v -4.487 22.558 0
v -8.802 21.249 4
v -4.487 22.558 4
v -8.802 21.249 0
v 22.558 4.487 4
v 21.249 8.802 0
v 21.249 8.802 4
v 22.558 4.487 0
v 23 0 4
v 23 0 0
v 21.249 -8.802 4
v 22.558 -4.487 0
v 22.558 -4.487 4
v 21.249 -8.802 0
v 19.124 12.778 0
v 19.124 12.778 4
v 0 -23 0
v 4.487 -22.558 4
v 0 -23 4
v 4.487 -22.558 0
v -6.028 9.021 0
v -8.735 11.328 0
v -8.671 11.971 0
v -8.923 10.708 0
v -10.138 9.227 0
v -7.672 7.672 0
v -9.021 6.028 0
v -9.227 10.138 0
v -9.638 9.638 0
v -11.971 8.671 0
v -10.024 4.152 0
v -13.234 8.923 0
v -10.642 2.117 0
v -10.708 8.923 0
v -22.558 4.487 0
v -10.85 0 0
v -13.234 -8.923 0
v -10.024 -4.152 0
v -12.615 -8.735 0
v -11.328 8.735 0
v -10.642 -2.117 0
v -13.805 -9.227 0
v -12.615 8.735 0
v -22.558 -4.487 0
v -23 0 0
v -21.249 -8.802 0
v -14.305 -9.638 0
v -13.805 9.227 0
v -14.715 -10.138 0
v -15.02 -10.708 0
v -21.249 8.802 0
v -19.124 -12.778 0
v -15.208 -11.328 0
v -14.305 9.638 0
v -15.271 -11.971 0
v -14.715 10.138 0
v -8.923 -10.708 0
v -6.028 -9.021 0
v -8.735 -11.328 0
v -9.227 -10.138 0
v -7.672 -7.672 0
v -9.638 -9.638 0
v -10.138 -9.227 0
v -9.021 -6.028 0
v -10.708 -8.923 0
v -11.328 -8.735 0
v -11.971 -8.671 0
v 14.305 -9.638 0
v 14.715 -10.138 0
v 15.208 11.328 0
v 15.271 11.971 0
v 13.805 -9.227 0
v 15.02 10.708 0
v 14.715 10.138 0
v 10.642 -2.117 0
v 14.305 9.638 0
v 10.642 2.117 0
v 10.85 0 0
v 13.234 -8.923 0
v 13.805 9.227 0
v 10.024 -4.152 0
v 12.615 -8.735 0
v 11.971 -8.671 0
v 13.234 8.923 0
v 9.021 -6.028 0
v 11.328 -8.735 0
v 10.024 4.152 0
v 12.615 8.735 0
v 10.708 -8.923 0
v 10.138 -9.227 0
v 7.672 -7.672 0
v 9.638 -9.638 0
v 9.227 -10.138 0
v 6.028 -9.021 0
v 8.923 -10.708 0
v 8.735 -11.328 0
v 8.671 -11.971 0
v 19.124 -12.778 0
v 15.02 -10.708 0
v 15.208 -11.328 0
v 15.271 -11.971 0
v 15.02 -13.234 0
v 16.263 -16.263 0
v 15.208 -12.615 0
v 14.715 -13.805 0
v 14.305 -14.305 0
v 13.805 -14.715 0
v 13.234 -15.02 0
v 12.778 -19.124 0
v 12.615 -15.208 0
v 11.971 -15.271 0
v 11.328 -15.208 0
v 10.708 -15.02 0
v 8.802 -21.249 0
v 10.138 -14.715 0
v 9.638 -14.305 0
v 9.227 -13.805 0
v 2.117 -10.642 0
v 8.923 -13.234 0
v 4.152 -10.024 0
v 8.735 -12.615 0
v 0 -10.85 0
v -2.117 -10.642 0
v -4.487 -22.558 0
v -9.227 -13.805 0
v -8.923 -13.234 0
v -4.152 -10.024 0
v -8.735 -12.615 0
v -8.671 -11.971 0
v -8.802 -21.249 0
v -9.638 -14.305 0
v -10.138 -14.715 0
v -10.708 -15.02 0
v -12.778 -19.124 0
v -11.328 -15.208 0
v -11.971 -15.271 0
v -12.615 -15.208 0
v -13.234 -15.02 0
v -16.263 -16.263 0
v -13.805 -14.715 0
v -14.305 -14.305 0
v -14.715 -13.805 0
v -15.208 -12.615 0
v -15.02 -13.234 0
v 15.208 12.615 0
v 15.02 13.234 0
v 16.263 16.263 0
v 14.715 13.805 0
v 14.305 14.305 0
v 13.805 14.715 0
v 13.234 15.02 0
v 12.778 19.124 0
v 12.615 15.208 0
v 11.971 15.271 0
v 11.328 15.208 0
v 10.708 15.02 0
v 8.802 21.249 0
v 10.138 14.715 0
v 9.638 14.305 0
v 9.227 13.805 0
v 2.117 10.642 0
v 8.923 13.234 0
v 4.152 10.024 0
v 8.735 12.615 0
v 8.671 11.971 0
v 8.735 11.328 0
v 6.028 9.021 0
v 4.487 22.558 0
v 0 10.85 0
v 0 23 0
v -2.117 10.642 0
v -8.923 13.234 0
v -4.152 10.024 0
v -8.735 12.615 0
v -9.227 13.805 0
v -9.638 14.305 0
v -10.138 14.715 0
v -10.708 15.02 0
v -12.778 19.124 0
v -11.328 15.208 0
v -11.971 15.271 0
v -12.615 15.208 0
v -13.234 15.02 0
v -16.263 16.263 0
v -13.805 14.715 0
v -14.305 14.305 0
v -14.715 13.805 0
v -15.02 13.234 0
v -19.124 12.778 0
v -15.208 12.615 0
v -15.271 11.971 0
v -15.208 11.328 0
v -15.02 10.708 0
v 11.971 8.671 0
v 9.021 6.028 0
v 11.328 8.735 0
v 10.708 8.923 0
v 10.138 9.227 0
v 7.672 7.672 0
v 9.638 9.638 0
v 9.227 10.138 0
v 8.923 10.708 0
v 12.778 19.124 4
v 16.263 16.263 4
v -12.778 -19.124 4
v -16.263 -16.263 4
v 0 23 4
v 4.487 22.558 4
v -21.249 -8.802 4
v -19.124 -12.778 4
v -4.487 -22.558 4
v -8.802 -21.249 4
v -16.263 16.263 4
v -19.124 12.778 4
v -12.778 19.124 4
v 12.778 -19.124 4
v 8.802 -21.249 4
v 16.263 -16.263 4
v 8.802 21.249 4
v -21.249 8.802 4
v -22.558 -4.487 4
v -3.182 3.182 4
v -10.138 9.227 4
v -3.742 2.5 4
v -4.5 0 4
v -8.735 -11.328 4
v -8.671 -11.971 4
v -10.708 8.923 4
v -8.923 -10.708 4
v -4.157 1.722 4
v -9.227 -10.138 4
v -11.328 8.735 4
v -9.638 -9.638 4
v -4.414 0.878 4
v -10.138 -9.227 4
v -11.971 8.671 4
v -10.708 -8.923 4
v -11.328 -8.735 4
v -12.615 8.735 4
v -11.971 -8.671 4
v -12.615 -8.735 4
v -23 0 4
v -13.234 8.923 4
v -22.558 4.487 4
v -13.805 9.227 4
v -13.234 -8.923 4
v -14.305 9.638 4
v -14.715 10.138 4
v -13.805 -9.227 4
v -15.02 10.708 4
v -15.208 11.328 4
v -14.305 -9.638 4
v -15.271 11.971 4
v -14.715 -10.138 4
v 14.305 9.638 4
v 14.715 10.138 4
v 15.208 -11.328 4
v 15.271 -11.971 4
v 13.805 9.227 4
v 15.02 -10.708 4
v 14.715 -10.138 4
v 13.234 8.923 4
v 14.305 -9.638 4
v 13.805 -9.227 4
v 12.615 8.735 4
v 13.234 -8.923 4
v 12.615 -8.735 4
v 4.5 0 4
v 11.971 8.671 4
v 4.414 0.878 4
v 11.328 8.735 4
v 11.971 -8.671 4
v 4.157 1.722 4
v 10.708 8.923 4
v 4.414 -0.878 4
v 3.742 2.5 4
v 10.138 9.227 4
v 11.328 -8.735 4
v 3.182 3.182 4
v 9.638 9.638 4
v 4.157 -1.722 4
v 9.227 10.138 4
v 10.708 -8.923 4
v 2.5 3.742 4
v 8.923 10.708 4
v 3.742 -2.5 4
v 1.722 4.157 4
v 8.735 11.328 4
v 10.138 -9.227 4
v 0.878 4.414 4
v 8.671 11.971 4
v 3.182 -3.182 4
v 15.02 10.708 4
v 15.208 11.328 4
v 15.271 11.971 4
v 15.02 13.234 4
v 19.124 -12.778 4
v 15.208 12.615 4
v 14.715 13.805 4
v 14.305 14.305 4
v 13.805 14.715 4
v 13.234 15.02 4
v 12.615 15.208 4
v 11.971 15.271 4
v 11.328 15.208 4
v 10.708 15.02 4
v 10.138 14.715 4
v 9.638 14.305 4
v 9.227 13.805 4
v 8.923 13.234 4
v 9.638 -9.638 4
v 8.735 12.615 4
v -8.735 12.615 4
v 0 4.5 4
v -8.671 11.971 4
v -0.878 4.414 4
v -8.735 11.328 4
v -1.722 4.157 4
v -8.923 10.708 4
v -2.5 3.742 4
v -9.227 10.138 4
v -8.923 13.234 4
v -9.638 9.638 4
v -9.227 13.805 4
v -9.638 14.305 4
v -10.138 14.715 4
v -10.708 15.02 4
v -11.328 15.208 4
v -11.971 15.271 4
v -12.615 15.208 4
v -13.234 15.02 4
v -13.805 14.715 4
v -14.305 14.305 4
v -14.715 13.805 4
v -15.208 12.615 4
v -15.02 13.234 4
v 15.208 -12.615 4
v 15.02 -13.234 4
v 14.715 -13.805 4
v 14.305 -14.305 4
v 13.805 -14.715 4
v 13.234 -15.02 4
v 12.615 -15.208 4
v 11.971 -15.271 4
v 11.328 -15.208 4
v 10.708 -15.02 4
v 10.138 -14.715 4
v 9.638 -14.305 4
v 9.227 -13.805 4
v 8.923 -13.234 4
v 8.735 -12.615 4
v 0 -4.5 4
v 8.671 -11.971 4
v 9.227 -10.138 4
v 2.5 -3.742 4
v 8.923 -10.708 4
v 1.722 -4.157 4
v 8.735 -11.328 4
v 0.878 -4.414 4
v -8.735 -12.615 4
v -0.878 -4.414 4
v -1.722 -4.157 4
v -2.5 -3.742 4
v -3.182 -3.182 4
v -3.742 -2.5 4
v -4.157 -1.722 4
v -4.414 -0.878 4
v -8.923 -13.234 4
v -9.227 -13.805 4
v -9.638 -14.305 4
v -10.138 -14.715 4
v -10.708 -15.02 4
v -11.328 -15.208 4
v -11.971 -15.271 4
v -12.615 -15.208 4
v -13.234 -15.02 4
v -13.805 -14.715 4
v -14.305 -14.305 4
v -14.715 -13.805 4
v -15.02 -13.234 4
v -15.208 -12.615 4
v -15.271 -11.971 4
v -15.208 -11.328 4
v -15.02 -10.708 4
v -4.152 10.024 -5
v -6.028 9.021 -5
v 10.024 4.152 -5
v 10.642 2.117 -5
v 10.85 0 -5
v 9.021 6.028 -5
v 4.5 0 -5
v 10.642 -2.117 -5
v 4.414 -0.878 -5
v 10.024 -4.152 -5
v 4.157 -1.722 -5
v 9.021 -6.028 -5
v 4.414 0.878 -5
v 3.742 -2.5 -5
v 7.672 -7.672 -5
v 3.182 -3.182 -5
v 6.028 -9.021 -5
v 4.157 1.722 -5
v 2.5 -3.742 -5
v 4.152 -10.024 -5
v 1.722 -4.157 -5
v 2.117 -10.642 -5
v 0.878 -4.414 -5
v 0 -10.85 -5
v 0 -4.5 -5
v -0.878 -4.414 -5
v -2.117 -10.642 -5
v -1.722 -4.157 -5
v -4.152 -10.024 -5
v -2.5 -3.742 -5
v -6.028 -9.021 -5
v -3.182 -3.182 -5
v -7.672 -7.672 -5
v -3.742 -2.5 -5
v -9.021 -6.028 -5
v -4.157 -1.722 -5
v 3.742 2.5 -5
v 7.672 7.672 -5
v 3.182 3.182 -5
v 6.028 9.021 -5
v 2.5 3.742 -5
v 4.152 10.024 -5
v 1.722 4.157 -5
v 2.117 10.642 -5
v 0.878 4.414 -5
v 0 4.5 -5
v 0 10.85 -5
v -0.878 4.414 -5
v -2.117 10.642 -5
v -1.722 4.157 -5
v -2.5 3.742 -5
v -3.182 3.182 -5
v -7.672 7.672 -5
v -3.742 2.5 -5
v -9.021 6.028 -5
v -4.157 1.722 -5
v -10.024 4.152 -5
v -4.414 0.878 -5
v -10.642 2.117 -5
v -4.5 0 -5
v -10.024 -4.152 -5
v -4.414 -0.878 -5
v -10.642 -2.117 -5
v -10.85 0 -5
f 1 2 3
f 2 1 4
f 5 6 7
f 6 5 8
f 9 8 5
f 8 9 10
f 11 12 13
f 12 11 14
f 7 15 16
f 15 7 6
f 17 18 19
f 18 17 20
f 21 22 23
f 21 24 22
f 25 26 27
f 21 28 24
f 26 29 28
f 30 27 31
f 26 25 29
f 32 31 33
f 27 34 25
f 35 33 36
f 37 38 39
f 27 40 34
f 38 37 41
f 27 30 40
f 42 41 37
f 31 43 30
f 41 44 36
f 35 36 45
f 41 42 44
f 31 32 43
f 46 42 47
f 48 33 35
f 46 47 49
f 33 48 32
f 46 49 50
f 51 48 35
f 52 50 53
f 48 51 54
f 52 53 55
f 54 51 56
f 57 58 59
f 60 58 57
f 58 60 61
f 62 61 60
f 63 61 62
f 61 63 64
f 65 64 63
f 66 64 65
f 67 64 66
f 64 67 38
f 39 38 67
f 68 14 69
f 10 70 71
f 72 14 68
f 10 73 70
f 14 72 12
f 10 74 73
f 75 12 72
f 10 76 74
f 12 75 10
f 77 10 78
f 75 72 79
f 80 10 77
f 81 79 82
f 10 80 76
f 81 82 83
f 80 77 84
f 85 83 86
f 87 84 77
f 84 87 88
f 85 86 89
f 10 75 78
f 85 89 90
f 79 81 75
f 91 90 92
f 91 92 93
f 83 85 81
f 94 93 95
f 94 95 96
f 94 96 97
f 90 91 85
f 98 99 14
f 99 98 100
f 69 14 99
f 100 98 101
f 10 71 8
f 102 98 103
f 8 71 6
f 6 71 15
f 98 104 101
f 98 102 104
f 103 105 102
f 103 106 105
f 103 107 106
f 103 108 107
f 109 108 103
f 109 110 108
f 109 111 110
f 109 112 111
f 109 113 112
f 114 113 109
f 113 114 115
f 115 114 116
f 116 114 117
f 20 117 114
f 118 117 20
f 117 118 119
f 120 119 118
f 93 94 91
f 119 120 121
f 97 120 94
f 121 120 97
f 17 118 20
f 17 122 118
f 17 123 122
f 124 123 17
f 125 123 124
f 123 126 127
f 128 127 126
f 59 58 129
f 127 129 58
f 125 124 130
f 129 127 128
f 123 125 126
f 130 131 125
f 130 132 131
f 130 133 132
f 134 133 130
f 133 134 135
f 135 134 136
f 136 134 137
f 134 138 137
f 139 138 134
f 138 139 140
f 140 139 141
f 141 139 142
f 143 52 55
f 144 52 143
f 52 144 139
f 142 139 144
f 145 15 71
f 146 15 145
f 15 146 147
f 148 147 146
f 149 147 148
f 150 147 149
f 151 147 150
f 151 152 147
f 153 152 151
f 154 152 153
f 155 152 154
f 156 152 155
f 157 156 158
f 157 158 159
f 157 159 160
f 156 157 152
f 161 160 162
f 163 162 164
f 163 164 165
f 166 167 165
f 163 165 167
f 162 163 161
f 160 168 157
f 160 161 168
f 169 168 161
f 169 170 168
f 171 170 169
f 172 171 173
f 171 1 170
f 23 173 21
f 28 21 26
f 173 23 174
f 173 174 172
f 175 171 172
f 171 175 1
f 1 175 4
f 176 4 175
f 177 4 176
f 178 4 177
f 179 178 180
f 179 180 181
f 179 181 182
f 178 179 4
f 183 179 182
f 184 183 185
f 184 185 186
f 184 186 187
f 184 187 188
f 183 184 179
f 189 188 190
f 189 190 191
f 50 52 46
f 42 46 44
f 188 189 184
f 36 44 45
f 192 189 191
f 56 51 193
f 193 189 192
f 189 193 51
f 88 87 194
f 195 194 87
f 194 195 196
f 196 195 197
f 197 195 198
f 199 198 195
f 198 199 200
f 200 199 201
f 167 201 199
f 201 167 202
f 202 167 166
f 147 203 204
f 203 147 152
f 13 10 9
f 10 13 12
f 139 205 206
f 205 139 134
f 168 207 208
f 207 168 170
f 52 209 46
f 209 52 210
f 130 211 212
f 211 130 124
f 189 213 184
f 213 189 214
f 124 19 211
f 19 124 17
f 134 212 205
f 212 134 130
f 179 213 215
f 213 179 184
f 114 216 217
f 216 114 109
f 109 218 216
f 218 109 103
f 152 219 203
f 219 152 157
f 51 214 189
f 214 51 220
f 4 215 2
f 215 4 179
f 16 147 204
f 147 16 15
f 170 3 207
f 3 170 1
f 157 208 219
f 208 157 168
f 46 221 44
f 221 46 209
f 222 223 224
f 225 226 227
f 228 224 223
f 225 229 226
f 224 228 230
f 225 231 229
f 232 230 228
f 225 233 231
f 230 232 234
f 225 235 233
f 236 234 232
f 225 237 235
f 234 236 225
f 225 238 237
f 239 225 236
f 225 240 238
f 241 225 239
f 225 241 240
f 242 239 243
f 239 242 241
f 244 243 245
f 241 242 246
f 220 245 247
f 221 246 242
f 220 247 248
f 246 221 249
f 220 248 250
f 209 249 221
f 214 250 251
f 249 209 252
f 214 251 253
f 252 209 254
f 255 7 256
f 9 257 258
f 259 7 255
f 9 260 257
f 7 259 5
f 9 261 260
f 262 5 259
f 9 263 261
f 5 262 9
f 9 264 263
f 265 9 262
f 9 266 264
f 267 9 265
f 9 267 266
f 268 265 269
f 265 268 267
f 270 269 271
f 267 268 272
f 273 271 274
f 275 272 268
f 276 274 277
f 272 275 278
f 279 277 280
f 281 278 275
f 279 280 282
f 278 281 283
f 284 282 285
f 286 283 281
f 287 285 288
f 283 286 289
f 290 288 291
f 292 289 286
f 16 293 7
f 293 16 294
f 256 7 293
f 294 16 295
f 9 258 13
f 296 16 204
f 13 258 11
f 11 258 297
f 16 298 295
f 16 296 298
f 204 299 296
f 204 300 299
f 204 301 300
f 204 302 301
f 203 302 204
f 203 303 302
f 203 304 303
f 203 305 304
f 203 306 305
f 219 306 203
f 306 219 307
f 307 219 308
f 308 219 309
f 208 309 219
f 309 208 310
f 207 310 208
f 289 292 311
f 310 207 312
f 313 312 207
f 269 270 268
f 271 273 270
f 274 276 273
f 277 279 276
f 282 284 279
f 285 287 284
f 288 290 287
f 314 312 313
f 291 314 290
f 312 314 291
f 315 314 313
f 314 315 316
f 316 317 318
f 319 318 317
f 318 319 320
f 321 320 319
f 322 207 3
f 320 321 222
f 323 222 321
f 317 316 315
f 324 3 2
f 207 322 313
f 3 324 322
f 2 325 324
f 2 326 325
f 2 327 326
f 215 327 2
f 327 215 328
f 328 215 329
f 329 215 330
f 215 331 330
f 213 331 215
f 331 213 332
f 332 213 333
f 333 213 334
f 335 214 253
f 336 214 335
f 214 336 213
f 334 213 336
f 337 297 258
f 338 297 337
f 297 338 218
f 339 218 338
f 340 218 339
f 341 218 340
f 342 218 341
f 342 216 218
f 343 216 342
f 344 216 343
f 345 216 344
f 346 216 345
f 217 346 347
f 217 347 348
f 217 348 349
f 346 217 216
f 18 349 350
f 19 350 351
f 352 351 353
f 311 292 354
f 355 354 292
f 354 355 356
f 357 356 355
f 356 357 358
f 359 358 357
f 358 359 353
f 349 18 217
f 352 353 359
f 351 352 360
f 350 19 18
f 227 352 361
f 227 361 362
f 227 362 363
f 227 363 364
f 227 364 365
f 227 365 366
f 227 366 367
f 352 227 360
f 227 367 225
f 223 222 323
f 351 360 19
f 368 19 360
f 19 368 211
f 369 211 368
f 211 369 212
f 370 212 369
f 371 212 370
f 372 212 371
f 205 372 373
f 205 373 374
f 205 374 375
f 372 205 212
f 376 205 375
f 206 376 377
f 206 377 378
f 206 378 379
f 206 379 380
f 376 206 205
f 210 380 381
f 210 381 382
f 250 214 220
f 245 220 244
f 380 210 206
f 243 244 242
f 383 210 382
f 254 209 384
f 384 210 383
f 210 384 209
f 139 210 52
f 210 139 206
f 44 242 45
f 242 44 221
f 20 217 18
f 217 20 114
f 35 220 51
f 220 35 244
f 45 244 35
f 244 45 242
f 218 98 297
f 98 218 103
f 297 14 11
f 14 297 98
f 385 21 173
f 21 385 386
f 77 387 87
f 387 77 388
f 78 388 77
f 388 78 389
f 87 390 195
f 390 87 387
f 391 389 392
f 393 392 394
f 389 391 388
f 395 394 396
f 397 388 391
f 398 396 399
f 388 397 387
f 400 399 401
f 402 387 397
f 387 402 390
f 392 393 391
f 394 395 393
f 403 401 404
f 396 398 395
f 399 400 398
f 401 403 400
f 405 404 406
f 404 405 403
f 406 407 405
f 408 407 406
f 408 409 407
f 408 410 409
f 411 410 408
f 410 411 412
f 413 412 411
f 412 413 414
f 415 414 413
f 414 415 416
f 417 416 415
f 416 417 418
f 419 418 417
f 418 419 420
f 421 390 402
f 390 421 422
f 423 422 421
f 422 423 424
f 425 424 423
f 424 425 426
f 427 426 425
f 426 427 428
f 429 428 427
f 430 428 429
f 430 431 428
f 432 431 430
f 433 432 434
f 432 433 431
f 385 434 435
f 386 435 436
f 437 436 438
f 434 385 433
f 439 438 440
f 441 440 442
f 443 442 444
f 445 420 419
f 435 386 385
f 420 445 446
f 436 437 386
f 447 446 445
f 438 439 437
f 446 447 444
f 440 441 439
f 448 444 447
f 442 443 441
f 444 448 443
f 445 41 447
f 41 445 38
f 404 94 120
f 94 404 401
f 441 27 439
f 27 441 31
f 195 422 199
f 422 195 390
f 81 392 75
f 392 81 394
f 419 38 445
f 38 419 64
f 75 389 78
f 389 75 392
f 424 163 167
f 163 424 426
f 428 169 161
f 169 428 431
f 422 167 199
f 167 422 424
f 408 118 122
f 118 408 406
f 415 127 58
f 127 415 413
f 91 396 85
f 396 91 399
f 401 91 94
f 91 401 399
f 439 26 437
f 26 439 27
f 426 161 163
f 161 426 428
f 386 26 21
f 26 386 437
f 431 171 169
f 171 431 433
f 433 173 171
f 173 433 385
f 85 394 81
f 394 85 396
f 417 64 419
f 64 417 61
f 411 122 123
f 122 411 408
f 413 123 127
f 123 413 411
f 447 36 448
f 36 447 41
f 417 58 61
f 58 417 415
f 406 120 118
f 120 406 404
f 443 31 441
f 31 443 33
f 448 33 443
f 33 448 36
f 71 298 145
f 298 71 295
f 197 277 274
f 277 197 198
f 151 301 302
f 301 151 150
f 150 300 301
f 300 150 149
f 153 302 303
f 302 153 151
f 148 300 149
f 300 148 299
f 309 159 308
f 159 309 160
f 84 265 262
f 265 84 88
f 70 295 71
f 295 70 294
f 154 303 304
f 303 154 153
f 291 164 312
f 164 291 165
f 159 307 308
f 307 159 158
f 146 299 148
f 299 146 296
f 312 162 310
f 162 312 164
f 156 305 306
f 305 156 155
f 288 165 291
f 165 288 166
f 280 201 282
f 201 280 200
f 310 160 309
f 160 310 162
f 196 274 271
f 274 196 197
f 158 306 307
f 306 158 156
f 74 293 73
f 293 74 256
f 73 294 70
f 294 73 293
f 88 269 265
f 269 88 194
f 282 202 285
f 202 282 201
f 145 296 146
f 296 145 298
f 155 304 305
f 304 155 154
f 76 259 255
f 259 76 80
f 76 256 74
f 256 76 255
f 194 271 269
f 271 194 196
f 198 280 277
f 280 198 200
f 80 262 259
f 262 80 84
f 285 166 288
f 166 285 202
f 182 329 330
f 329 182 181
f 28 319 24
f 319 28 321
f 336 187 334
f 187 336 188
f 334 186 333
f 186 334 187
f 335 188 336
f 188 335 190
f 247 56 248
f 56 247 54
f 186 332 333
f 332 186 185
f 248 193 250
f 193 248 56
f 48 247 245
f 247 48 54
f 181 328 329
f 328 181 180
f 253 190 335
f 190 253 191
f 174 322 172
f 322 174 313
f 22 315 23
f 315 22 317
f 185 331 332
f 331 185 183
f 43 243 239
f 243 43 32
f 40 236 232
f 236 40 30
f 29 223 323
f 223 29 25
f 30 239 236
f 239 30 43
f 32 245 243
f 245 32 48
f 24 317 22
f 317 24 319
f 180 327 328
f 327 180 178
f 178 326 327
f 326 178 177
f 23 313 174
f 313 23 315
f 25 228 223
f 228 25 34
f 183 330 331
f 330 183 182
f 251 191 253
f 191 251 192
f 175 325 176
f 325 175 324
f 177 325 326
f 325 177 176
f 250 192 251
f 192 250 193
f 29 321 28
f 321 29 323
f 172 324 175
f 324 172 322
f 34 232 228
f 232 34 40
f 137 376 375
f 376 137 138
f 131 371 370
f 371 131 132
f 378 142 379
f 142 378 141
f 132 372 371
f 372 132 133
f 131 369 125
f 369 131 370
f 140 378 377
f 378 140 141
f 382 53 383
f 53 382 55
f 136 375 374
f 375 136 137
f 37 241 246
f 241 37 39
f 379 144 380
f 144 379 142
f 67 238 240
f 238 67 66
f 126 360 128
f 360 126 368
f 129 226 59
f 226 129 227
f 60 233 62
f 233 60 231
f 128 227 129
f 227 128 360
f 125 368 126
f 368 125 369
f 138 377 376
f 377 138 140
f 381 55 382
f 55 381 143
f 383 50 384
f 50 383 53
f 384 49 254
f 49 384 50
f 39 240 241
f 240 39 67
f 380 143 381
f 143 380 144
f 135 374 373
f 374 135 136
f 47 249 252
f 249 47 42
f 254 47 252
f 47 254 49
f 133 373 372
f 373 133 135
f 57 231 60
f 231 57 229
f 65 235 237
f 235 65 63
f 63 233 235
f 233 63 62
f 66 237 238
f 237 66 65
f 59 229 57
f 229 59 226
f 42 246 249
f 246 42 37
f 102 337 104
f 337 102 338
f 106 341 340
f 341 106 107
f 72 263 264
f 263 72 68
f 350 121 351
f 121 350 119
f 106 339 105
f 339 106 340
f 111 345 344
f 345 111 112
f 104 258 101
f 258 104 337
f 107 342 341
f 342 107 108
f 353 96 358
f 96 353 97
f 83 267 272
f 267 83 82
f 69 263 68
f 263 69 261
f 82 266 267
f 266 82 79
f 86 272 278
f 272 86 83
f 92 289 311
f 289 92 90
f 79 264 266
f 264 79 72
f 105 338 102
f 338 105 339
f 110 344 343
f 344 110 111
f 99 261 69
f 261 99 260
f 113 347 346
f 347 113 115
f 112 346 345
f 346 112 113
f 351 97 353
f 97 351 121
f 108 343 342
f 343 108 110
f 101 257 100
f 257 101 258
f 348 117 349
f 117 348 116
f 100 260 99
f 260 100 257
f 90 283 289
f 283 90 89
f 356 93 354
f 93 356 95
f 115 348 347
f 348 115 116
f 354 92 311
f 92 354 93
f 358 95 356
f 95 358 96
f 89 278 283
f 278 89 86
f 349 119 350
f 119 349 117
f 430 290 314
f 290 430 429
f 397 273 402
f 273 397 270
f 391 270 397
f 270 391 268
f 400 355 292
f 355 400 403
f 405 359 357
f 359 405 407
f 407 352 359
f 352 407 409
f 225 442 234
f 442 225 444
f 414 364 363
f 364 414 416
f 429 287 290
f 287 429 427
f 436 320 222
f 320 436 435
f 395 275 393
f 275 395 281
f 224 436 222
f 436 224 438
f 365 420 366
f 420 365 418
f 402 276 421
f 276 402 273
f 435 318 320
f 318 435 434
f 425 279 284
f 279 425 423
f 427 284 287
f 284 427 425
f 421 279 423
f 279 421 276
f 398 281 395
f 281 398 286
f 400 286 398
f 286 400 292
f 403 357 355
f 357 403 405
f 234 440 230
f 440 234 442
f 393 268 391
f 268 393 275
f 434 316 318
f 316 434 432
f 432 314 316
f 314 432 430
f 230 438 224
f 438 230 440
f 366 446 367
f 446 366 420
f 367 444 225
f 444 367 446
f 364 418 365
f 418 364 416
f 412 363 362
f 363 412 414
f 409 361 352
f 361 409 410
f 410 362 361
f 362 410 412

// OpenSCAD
$fn = 32;

// ----------------------------------------------------------------------
// Retaining cap: 608 cover, 46 mm, spigot 21.7 mm
// ----------------------------------------------------------------------

// --- parameters (mm) ---
plate_d = 46;             // cover diameter
plate_t = 4;              // cover thickness
boss_d = 21.7;            // spigot that enters the housing
boss_h = 5;               // spigot height
shaft_d = 9;              // shaft opening
bolt_d = 6.6;             // bolt clearance
bolt_r = 16.93;           // bolt circle radius

module cover() {
  cylinder(h = plate_t, d = plate_d);
}

module spigot() {
  /* sunk 1 mm into the cover; the spigot sets the overall height */
  translate([0, 0, -boss_h]) cylinder(h = boss_h + 1, d = boss_d);
}

difference() {
  union() {
    cover();
    spigot();
  }
  for (i = [0 : 3]) rotate([0, 0, 45 + i * 90]) translate([bolt_r, 0, -boss_h - 1])
    cylinder(h = boss_h + plate_t + 2, d = bolt_d);
  translate([0, 0, -boss_h - 1]) cylinder(h = boss_h + plate_t + 2, d = shaft_d);
}
